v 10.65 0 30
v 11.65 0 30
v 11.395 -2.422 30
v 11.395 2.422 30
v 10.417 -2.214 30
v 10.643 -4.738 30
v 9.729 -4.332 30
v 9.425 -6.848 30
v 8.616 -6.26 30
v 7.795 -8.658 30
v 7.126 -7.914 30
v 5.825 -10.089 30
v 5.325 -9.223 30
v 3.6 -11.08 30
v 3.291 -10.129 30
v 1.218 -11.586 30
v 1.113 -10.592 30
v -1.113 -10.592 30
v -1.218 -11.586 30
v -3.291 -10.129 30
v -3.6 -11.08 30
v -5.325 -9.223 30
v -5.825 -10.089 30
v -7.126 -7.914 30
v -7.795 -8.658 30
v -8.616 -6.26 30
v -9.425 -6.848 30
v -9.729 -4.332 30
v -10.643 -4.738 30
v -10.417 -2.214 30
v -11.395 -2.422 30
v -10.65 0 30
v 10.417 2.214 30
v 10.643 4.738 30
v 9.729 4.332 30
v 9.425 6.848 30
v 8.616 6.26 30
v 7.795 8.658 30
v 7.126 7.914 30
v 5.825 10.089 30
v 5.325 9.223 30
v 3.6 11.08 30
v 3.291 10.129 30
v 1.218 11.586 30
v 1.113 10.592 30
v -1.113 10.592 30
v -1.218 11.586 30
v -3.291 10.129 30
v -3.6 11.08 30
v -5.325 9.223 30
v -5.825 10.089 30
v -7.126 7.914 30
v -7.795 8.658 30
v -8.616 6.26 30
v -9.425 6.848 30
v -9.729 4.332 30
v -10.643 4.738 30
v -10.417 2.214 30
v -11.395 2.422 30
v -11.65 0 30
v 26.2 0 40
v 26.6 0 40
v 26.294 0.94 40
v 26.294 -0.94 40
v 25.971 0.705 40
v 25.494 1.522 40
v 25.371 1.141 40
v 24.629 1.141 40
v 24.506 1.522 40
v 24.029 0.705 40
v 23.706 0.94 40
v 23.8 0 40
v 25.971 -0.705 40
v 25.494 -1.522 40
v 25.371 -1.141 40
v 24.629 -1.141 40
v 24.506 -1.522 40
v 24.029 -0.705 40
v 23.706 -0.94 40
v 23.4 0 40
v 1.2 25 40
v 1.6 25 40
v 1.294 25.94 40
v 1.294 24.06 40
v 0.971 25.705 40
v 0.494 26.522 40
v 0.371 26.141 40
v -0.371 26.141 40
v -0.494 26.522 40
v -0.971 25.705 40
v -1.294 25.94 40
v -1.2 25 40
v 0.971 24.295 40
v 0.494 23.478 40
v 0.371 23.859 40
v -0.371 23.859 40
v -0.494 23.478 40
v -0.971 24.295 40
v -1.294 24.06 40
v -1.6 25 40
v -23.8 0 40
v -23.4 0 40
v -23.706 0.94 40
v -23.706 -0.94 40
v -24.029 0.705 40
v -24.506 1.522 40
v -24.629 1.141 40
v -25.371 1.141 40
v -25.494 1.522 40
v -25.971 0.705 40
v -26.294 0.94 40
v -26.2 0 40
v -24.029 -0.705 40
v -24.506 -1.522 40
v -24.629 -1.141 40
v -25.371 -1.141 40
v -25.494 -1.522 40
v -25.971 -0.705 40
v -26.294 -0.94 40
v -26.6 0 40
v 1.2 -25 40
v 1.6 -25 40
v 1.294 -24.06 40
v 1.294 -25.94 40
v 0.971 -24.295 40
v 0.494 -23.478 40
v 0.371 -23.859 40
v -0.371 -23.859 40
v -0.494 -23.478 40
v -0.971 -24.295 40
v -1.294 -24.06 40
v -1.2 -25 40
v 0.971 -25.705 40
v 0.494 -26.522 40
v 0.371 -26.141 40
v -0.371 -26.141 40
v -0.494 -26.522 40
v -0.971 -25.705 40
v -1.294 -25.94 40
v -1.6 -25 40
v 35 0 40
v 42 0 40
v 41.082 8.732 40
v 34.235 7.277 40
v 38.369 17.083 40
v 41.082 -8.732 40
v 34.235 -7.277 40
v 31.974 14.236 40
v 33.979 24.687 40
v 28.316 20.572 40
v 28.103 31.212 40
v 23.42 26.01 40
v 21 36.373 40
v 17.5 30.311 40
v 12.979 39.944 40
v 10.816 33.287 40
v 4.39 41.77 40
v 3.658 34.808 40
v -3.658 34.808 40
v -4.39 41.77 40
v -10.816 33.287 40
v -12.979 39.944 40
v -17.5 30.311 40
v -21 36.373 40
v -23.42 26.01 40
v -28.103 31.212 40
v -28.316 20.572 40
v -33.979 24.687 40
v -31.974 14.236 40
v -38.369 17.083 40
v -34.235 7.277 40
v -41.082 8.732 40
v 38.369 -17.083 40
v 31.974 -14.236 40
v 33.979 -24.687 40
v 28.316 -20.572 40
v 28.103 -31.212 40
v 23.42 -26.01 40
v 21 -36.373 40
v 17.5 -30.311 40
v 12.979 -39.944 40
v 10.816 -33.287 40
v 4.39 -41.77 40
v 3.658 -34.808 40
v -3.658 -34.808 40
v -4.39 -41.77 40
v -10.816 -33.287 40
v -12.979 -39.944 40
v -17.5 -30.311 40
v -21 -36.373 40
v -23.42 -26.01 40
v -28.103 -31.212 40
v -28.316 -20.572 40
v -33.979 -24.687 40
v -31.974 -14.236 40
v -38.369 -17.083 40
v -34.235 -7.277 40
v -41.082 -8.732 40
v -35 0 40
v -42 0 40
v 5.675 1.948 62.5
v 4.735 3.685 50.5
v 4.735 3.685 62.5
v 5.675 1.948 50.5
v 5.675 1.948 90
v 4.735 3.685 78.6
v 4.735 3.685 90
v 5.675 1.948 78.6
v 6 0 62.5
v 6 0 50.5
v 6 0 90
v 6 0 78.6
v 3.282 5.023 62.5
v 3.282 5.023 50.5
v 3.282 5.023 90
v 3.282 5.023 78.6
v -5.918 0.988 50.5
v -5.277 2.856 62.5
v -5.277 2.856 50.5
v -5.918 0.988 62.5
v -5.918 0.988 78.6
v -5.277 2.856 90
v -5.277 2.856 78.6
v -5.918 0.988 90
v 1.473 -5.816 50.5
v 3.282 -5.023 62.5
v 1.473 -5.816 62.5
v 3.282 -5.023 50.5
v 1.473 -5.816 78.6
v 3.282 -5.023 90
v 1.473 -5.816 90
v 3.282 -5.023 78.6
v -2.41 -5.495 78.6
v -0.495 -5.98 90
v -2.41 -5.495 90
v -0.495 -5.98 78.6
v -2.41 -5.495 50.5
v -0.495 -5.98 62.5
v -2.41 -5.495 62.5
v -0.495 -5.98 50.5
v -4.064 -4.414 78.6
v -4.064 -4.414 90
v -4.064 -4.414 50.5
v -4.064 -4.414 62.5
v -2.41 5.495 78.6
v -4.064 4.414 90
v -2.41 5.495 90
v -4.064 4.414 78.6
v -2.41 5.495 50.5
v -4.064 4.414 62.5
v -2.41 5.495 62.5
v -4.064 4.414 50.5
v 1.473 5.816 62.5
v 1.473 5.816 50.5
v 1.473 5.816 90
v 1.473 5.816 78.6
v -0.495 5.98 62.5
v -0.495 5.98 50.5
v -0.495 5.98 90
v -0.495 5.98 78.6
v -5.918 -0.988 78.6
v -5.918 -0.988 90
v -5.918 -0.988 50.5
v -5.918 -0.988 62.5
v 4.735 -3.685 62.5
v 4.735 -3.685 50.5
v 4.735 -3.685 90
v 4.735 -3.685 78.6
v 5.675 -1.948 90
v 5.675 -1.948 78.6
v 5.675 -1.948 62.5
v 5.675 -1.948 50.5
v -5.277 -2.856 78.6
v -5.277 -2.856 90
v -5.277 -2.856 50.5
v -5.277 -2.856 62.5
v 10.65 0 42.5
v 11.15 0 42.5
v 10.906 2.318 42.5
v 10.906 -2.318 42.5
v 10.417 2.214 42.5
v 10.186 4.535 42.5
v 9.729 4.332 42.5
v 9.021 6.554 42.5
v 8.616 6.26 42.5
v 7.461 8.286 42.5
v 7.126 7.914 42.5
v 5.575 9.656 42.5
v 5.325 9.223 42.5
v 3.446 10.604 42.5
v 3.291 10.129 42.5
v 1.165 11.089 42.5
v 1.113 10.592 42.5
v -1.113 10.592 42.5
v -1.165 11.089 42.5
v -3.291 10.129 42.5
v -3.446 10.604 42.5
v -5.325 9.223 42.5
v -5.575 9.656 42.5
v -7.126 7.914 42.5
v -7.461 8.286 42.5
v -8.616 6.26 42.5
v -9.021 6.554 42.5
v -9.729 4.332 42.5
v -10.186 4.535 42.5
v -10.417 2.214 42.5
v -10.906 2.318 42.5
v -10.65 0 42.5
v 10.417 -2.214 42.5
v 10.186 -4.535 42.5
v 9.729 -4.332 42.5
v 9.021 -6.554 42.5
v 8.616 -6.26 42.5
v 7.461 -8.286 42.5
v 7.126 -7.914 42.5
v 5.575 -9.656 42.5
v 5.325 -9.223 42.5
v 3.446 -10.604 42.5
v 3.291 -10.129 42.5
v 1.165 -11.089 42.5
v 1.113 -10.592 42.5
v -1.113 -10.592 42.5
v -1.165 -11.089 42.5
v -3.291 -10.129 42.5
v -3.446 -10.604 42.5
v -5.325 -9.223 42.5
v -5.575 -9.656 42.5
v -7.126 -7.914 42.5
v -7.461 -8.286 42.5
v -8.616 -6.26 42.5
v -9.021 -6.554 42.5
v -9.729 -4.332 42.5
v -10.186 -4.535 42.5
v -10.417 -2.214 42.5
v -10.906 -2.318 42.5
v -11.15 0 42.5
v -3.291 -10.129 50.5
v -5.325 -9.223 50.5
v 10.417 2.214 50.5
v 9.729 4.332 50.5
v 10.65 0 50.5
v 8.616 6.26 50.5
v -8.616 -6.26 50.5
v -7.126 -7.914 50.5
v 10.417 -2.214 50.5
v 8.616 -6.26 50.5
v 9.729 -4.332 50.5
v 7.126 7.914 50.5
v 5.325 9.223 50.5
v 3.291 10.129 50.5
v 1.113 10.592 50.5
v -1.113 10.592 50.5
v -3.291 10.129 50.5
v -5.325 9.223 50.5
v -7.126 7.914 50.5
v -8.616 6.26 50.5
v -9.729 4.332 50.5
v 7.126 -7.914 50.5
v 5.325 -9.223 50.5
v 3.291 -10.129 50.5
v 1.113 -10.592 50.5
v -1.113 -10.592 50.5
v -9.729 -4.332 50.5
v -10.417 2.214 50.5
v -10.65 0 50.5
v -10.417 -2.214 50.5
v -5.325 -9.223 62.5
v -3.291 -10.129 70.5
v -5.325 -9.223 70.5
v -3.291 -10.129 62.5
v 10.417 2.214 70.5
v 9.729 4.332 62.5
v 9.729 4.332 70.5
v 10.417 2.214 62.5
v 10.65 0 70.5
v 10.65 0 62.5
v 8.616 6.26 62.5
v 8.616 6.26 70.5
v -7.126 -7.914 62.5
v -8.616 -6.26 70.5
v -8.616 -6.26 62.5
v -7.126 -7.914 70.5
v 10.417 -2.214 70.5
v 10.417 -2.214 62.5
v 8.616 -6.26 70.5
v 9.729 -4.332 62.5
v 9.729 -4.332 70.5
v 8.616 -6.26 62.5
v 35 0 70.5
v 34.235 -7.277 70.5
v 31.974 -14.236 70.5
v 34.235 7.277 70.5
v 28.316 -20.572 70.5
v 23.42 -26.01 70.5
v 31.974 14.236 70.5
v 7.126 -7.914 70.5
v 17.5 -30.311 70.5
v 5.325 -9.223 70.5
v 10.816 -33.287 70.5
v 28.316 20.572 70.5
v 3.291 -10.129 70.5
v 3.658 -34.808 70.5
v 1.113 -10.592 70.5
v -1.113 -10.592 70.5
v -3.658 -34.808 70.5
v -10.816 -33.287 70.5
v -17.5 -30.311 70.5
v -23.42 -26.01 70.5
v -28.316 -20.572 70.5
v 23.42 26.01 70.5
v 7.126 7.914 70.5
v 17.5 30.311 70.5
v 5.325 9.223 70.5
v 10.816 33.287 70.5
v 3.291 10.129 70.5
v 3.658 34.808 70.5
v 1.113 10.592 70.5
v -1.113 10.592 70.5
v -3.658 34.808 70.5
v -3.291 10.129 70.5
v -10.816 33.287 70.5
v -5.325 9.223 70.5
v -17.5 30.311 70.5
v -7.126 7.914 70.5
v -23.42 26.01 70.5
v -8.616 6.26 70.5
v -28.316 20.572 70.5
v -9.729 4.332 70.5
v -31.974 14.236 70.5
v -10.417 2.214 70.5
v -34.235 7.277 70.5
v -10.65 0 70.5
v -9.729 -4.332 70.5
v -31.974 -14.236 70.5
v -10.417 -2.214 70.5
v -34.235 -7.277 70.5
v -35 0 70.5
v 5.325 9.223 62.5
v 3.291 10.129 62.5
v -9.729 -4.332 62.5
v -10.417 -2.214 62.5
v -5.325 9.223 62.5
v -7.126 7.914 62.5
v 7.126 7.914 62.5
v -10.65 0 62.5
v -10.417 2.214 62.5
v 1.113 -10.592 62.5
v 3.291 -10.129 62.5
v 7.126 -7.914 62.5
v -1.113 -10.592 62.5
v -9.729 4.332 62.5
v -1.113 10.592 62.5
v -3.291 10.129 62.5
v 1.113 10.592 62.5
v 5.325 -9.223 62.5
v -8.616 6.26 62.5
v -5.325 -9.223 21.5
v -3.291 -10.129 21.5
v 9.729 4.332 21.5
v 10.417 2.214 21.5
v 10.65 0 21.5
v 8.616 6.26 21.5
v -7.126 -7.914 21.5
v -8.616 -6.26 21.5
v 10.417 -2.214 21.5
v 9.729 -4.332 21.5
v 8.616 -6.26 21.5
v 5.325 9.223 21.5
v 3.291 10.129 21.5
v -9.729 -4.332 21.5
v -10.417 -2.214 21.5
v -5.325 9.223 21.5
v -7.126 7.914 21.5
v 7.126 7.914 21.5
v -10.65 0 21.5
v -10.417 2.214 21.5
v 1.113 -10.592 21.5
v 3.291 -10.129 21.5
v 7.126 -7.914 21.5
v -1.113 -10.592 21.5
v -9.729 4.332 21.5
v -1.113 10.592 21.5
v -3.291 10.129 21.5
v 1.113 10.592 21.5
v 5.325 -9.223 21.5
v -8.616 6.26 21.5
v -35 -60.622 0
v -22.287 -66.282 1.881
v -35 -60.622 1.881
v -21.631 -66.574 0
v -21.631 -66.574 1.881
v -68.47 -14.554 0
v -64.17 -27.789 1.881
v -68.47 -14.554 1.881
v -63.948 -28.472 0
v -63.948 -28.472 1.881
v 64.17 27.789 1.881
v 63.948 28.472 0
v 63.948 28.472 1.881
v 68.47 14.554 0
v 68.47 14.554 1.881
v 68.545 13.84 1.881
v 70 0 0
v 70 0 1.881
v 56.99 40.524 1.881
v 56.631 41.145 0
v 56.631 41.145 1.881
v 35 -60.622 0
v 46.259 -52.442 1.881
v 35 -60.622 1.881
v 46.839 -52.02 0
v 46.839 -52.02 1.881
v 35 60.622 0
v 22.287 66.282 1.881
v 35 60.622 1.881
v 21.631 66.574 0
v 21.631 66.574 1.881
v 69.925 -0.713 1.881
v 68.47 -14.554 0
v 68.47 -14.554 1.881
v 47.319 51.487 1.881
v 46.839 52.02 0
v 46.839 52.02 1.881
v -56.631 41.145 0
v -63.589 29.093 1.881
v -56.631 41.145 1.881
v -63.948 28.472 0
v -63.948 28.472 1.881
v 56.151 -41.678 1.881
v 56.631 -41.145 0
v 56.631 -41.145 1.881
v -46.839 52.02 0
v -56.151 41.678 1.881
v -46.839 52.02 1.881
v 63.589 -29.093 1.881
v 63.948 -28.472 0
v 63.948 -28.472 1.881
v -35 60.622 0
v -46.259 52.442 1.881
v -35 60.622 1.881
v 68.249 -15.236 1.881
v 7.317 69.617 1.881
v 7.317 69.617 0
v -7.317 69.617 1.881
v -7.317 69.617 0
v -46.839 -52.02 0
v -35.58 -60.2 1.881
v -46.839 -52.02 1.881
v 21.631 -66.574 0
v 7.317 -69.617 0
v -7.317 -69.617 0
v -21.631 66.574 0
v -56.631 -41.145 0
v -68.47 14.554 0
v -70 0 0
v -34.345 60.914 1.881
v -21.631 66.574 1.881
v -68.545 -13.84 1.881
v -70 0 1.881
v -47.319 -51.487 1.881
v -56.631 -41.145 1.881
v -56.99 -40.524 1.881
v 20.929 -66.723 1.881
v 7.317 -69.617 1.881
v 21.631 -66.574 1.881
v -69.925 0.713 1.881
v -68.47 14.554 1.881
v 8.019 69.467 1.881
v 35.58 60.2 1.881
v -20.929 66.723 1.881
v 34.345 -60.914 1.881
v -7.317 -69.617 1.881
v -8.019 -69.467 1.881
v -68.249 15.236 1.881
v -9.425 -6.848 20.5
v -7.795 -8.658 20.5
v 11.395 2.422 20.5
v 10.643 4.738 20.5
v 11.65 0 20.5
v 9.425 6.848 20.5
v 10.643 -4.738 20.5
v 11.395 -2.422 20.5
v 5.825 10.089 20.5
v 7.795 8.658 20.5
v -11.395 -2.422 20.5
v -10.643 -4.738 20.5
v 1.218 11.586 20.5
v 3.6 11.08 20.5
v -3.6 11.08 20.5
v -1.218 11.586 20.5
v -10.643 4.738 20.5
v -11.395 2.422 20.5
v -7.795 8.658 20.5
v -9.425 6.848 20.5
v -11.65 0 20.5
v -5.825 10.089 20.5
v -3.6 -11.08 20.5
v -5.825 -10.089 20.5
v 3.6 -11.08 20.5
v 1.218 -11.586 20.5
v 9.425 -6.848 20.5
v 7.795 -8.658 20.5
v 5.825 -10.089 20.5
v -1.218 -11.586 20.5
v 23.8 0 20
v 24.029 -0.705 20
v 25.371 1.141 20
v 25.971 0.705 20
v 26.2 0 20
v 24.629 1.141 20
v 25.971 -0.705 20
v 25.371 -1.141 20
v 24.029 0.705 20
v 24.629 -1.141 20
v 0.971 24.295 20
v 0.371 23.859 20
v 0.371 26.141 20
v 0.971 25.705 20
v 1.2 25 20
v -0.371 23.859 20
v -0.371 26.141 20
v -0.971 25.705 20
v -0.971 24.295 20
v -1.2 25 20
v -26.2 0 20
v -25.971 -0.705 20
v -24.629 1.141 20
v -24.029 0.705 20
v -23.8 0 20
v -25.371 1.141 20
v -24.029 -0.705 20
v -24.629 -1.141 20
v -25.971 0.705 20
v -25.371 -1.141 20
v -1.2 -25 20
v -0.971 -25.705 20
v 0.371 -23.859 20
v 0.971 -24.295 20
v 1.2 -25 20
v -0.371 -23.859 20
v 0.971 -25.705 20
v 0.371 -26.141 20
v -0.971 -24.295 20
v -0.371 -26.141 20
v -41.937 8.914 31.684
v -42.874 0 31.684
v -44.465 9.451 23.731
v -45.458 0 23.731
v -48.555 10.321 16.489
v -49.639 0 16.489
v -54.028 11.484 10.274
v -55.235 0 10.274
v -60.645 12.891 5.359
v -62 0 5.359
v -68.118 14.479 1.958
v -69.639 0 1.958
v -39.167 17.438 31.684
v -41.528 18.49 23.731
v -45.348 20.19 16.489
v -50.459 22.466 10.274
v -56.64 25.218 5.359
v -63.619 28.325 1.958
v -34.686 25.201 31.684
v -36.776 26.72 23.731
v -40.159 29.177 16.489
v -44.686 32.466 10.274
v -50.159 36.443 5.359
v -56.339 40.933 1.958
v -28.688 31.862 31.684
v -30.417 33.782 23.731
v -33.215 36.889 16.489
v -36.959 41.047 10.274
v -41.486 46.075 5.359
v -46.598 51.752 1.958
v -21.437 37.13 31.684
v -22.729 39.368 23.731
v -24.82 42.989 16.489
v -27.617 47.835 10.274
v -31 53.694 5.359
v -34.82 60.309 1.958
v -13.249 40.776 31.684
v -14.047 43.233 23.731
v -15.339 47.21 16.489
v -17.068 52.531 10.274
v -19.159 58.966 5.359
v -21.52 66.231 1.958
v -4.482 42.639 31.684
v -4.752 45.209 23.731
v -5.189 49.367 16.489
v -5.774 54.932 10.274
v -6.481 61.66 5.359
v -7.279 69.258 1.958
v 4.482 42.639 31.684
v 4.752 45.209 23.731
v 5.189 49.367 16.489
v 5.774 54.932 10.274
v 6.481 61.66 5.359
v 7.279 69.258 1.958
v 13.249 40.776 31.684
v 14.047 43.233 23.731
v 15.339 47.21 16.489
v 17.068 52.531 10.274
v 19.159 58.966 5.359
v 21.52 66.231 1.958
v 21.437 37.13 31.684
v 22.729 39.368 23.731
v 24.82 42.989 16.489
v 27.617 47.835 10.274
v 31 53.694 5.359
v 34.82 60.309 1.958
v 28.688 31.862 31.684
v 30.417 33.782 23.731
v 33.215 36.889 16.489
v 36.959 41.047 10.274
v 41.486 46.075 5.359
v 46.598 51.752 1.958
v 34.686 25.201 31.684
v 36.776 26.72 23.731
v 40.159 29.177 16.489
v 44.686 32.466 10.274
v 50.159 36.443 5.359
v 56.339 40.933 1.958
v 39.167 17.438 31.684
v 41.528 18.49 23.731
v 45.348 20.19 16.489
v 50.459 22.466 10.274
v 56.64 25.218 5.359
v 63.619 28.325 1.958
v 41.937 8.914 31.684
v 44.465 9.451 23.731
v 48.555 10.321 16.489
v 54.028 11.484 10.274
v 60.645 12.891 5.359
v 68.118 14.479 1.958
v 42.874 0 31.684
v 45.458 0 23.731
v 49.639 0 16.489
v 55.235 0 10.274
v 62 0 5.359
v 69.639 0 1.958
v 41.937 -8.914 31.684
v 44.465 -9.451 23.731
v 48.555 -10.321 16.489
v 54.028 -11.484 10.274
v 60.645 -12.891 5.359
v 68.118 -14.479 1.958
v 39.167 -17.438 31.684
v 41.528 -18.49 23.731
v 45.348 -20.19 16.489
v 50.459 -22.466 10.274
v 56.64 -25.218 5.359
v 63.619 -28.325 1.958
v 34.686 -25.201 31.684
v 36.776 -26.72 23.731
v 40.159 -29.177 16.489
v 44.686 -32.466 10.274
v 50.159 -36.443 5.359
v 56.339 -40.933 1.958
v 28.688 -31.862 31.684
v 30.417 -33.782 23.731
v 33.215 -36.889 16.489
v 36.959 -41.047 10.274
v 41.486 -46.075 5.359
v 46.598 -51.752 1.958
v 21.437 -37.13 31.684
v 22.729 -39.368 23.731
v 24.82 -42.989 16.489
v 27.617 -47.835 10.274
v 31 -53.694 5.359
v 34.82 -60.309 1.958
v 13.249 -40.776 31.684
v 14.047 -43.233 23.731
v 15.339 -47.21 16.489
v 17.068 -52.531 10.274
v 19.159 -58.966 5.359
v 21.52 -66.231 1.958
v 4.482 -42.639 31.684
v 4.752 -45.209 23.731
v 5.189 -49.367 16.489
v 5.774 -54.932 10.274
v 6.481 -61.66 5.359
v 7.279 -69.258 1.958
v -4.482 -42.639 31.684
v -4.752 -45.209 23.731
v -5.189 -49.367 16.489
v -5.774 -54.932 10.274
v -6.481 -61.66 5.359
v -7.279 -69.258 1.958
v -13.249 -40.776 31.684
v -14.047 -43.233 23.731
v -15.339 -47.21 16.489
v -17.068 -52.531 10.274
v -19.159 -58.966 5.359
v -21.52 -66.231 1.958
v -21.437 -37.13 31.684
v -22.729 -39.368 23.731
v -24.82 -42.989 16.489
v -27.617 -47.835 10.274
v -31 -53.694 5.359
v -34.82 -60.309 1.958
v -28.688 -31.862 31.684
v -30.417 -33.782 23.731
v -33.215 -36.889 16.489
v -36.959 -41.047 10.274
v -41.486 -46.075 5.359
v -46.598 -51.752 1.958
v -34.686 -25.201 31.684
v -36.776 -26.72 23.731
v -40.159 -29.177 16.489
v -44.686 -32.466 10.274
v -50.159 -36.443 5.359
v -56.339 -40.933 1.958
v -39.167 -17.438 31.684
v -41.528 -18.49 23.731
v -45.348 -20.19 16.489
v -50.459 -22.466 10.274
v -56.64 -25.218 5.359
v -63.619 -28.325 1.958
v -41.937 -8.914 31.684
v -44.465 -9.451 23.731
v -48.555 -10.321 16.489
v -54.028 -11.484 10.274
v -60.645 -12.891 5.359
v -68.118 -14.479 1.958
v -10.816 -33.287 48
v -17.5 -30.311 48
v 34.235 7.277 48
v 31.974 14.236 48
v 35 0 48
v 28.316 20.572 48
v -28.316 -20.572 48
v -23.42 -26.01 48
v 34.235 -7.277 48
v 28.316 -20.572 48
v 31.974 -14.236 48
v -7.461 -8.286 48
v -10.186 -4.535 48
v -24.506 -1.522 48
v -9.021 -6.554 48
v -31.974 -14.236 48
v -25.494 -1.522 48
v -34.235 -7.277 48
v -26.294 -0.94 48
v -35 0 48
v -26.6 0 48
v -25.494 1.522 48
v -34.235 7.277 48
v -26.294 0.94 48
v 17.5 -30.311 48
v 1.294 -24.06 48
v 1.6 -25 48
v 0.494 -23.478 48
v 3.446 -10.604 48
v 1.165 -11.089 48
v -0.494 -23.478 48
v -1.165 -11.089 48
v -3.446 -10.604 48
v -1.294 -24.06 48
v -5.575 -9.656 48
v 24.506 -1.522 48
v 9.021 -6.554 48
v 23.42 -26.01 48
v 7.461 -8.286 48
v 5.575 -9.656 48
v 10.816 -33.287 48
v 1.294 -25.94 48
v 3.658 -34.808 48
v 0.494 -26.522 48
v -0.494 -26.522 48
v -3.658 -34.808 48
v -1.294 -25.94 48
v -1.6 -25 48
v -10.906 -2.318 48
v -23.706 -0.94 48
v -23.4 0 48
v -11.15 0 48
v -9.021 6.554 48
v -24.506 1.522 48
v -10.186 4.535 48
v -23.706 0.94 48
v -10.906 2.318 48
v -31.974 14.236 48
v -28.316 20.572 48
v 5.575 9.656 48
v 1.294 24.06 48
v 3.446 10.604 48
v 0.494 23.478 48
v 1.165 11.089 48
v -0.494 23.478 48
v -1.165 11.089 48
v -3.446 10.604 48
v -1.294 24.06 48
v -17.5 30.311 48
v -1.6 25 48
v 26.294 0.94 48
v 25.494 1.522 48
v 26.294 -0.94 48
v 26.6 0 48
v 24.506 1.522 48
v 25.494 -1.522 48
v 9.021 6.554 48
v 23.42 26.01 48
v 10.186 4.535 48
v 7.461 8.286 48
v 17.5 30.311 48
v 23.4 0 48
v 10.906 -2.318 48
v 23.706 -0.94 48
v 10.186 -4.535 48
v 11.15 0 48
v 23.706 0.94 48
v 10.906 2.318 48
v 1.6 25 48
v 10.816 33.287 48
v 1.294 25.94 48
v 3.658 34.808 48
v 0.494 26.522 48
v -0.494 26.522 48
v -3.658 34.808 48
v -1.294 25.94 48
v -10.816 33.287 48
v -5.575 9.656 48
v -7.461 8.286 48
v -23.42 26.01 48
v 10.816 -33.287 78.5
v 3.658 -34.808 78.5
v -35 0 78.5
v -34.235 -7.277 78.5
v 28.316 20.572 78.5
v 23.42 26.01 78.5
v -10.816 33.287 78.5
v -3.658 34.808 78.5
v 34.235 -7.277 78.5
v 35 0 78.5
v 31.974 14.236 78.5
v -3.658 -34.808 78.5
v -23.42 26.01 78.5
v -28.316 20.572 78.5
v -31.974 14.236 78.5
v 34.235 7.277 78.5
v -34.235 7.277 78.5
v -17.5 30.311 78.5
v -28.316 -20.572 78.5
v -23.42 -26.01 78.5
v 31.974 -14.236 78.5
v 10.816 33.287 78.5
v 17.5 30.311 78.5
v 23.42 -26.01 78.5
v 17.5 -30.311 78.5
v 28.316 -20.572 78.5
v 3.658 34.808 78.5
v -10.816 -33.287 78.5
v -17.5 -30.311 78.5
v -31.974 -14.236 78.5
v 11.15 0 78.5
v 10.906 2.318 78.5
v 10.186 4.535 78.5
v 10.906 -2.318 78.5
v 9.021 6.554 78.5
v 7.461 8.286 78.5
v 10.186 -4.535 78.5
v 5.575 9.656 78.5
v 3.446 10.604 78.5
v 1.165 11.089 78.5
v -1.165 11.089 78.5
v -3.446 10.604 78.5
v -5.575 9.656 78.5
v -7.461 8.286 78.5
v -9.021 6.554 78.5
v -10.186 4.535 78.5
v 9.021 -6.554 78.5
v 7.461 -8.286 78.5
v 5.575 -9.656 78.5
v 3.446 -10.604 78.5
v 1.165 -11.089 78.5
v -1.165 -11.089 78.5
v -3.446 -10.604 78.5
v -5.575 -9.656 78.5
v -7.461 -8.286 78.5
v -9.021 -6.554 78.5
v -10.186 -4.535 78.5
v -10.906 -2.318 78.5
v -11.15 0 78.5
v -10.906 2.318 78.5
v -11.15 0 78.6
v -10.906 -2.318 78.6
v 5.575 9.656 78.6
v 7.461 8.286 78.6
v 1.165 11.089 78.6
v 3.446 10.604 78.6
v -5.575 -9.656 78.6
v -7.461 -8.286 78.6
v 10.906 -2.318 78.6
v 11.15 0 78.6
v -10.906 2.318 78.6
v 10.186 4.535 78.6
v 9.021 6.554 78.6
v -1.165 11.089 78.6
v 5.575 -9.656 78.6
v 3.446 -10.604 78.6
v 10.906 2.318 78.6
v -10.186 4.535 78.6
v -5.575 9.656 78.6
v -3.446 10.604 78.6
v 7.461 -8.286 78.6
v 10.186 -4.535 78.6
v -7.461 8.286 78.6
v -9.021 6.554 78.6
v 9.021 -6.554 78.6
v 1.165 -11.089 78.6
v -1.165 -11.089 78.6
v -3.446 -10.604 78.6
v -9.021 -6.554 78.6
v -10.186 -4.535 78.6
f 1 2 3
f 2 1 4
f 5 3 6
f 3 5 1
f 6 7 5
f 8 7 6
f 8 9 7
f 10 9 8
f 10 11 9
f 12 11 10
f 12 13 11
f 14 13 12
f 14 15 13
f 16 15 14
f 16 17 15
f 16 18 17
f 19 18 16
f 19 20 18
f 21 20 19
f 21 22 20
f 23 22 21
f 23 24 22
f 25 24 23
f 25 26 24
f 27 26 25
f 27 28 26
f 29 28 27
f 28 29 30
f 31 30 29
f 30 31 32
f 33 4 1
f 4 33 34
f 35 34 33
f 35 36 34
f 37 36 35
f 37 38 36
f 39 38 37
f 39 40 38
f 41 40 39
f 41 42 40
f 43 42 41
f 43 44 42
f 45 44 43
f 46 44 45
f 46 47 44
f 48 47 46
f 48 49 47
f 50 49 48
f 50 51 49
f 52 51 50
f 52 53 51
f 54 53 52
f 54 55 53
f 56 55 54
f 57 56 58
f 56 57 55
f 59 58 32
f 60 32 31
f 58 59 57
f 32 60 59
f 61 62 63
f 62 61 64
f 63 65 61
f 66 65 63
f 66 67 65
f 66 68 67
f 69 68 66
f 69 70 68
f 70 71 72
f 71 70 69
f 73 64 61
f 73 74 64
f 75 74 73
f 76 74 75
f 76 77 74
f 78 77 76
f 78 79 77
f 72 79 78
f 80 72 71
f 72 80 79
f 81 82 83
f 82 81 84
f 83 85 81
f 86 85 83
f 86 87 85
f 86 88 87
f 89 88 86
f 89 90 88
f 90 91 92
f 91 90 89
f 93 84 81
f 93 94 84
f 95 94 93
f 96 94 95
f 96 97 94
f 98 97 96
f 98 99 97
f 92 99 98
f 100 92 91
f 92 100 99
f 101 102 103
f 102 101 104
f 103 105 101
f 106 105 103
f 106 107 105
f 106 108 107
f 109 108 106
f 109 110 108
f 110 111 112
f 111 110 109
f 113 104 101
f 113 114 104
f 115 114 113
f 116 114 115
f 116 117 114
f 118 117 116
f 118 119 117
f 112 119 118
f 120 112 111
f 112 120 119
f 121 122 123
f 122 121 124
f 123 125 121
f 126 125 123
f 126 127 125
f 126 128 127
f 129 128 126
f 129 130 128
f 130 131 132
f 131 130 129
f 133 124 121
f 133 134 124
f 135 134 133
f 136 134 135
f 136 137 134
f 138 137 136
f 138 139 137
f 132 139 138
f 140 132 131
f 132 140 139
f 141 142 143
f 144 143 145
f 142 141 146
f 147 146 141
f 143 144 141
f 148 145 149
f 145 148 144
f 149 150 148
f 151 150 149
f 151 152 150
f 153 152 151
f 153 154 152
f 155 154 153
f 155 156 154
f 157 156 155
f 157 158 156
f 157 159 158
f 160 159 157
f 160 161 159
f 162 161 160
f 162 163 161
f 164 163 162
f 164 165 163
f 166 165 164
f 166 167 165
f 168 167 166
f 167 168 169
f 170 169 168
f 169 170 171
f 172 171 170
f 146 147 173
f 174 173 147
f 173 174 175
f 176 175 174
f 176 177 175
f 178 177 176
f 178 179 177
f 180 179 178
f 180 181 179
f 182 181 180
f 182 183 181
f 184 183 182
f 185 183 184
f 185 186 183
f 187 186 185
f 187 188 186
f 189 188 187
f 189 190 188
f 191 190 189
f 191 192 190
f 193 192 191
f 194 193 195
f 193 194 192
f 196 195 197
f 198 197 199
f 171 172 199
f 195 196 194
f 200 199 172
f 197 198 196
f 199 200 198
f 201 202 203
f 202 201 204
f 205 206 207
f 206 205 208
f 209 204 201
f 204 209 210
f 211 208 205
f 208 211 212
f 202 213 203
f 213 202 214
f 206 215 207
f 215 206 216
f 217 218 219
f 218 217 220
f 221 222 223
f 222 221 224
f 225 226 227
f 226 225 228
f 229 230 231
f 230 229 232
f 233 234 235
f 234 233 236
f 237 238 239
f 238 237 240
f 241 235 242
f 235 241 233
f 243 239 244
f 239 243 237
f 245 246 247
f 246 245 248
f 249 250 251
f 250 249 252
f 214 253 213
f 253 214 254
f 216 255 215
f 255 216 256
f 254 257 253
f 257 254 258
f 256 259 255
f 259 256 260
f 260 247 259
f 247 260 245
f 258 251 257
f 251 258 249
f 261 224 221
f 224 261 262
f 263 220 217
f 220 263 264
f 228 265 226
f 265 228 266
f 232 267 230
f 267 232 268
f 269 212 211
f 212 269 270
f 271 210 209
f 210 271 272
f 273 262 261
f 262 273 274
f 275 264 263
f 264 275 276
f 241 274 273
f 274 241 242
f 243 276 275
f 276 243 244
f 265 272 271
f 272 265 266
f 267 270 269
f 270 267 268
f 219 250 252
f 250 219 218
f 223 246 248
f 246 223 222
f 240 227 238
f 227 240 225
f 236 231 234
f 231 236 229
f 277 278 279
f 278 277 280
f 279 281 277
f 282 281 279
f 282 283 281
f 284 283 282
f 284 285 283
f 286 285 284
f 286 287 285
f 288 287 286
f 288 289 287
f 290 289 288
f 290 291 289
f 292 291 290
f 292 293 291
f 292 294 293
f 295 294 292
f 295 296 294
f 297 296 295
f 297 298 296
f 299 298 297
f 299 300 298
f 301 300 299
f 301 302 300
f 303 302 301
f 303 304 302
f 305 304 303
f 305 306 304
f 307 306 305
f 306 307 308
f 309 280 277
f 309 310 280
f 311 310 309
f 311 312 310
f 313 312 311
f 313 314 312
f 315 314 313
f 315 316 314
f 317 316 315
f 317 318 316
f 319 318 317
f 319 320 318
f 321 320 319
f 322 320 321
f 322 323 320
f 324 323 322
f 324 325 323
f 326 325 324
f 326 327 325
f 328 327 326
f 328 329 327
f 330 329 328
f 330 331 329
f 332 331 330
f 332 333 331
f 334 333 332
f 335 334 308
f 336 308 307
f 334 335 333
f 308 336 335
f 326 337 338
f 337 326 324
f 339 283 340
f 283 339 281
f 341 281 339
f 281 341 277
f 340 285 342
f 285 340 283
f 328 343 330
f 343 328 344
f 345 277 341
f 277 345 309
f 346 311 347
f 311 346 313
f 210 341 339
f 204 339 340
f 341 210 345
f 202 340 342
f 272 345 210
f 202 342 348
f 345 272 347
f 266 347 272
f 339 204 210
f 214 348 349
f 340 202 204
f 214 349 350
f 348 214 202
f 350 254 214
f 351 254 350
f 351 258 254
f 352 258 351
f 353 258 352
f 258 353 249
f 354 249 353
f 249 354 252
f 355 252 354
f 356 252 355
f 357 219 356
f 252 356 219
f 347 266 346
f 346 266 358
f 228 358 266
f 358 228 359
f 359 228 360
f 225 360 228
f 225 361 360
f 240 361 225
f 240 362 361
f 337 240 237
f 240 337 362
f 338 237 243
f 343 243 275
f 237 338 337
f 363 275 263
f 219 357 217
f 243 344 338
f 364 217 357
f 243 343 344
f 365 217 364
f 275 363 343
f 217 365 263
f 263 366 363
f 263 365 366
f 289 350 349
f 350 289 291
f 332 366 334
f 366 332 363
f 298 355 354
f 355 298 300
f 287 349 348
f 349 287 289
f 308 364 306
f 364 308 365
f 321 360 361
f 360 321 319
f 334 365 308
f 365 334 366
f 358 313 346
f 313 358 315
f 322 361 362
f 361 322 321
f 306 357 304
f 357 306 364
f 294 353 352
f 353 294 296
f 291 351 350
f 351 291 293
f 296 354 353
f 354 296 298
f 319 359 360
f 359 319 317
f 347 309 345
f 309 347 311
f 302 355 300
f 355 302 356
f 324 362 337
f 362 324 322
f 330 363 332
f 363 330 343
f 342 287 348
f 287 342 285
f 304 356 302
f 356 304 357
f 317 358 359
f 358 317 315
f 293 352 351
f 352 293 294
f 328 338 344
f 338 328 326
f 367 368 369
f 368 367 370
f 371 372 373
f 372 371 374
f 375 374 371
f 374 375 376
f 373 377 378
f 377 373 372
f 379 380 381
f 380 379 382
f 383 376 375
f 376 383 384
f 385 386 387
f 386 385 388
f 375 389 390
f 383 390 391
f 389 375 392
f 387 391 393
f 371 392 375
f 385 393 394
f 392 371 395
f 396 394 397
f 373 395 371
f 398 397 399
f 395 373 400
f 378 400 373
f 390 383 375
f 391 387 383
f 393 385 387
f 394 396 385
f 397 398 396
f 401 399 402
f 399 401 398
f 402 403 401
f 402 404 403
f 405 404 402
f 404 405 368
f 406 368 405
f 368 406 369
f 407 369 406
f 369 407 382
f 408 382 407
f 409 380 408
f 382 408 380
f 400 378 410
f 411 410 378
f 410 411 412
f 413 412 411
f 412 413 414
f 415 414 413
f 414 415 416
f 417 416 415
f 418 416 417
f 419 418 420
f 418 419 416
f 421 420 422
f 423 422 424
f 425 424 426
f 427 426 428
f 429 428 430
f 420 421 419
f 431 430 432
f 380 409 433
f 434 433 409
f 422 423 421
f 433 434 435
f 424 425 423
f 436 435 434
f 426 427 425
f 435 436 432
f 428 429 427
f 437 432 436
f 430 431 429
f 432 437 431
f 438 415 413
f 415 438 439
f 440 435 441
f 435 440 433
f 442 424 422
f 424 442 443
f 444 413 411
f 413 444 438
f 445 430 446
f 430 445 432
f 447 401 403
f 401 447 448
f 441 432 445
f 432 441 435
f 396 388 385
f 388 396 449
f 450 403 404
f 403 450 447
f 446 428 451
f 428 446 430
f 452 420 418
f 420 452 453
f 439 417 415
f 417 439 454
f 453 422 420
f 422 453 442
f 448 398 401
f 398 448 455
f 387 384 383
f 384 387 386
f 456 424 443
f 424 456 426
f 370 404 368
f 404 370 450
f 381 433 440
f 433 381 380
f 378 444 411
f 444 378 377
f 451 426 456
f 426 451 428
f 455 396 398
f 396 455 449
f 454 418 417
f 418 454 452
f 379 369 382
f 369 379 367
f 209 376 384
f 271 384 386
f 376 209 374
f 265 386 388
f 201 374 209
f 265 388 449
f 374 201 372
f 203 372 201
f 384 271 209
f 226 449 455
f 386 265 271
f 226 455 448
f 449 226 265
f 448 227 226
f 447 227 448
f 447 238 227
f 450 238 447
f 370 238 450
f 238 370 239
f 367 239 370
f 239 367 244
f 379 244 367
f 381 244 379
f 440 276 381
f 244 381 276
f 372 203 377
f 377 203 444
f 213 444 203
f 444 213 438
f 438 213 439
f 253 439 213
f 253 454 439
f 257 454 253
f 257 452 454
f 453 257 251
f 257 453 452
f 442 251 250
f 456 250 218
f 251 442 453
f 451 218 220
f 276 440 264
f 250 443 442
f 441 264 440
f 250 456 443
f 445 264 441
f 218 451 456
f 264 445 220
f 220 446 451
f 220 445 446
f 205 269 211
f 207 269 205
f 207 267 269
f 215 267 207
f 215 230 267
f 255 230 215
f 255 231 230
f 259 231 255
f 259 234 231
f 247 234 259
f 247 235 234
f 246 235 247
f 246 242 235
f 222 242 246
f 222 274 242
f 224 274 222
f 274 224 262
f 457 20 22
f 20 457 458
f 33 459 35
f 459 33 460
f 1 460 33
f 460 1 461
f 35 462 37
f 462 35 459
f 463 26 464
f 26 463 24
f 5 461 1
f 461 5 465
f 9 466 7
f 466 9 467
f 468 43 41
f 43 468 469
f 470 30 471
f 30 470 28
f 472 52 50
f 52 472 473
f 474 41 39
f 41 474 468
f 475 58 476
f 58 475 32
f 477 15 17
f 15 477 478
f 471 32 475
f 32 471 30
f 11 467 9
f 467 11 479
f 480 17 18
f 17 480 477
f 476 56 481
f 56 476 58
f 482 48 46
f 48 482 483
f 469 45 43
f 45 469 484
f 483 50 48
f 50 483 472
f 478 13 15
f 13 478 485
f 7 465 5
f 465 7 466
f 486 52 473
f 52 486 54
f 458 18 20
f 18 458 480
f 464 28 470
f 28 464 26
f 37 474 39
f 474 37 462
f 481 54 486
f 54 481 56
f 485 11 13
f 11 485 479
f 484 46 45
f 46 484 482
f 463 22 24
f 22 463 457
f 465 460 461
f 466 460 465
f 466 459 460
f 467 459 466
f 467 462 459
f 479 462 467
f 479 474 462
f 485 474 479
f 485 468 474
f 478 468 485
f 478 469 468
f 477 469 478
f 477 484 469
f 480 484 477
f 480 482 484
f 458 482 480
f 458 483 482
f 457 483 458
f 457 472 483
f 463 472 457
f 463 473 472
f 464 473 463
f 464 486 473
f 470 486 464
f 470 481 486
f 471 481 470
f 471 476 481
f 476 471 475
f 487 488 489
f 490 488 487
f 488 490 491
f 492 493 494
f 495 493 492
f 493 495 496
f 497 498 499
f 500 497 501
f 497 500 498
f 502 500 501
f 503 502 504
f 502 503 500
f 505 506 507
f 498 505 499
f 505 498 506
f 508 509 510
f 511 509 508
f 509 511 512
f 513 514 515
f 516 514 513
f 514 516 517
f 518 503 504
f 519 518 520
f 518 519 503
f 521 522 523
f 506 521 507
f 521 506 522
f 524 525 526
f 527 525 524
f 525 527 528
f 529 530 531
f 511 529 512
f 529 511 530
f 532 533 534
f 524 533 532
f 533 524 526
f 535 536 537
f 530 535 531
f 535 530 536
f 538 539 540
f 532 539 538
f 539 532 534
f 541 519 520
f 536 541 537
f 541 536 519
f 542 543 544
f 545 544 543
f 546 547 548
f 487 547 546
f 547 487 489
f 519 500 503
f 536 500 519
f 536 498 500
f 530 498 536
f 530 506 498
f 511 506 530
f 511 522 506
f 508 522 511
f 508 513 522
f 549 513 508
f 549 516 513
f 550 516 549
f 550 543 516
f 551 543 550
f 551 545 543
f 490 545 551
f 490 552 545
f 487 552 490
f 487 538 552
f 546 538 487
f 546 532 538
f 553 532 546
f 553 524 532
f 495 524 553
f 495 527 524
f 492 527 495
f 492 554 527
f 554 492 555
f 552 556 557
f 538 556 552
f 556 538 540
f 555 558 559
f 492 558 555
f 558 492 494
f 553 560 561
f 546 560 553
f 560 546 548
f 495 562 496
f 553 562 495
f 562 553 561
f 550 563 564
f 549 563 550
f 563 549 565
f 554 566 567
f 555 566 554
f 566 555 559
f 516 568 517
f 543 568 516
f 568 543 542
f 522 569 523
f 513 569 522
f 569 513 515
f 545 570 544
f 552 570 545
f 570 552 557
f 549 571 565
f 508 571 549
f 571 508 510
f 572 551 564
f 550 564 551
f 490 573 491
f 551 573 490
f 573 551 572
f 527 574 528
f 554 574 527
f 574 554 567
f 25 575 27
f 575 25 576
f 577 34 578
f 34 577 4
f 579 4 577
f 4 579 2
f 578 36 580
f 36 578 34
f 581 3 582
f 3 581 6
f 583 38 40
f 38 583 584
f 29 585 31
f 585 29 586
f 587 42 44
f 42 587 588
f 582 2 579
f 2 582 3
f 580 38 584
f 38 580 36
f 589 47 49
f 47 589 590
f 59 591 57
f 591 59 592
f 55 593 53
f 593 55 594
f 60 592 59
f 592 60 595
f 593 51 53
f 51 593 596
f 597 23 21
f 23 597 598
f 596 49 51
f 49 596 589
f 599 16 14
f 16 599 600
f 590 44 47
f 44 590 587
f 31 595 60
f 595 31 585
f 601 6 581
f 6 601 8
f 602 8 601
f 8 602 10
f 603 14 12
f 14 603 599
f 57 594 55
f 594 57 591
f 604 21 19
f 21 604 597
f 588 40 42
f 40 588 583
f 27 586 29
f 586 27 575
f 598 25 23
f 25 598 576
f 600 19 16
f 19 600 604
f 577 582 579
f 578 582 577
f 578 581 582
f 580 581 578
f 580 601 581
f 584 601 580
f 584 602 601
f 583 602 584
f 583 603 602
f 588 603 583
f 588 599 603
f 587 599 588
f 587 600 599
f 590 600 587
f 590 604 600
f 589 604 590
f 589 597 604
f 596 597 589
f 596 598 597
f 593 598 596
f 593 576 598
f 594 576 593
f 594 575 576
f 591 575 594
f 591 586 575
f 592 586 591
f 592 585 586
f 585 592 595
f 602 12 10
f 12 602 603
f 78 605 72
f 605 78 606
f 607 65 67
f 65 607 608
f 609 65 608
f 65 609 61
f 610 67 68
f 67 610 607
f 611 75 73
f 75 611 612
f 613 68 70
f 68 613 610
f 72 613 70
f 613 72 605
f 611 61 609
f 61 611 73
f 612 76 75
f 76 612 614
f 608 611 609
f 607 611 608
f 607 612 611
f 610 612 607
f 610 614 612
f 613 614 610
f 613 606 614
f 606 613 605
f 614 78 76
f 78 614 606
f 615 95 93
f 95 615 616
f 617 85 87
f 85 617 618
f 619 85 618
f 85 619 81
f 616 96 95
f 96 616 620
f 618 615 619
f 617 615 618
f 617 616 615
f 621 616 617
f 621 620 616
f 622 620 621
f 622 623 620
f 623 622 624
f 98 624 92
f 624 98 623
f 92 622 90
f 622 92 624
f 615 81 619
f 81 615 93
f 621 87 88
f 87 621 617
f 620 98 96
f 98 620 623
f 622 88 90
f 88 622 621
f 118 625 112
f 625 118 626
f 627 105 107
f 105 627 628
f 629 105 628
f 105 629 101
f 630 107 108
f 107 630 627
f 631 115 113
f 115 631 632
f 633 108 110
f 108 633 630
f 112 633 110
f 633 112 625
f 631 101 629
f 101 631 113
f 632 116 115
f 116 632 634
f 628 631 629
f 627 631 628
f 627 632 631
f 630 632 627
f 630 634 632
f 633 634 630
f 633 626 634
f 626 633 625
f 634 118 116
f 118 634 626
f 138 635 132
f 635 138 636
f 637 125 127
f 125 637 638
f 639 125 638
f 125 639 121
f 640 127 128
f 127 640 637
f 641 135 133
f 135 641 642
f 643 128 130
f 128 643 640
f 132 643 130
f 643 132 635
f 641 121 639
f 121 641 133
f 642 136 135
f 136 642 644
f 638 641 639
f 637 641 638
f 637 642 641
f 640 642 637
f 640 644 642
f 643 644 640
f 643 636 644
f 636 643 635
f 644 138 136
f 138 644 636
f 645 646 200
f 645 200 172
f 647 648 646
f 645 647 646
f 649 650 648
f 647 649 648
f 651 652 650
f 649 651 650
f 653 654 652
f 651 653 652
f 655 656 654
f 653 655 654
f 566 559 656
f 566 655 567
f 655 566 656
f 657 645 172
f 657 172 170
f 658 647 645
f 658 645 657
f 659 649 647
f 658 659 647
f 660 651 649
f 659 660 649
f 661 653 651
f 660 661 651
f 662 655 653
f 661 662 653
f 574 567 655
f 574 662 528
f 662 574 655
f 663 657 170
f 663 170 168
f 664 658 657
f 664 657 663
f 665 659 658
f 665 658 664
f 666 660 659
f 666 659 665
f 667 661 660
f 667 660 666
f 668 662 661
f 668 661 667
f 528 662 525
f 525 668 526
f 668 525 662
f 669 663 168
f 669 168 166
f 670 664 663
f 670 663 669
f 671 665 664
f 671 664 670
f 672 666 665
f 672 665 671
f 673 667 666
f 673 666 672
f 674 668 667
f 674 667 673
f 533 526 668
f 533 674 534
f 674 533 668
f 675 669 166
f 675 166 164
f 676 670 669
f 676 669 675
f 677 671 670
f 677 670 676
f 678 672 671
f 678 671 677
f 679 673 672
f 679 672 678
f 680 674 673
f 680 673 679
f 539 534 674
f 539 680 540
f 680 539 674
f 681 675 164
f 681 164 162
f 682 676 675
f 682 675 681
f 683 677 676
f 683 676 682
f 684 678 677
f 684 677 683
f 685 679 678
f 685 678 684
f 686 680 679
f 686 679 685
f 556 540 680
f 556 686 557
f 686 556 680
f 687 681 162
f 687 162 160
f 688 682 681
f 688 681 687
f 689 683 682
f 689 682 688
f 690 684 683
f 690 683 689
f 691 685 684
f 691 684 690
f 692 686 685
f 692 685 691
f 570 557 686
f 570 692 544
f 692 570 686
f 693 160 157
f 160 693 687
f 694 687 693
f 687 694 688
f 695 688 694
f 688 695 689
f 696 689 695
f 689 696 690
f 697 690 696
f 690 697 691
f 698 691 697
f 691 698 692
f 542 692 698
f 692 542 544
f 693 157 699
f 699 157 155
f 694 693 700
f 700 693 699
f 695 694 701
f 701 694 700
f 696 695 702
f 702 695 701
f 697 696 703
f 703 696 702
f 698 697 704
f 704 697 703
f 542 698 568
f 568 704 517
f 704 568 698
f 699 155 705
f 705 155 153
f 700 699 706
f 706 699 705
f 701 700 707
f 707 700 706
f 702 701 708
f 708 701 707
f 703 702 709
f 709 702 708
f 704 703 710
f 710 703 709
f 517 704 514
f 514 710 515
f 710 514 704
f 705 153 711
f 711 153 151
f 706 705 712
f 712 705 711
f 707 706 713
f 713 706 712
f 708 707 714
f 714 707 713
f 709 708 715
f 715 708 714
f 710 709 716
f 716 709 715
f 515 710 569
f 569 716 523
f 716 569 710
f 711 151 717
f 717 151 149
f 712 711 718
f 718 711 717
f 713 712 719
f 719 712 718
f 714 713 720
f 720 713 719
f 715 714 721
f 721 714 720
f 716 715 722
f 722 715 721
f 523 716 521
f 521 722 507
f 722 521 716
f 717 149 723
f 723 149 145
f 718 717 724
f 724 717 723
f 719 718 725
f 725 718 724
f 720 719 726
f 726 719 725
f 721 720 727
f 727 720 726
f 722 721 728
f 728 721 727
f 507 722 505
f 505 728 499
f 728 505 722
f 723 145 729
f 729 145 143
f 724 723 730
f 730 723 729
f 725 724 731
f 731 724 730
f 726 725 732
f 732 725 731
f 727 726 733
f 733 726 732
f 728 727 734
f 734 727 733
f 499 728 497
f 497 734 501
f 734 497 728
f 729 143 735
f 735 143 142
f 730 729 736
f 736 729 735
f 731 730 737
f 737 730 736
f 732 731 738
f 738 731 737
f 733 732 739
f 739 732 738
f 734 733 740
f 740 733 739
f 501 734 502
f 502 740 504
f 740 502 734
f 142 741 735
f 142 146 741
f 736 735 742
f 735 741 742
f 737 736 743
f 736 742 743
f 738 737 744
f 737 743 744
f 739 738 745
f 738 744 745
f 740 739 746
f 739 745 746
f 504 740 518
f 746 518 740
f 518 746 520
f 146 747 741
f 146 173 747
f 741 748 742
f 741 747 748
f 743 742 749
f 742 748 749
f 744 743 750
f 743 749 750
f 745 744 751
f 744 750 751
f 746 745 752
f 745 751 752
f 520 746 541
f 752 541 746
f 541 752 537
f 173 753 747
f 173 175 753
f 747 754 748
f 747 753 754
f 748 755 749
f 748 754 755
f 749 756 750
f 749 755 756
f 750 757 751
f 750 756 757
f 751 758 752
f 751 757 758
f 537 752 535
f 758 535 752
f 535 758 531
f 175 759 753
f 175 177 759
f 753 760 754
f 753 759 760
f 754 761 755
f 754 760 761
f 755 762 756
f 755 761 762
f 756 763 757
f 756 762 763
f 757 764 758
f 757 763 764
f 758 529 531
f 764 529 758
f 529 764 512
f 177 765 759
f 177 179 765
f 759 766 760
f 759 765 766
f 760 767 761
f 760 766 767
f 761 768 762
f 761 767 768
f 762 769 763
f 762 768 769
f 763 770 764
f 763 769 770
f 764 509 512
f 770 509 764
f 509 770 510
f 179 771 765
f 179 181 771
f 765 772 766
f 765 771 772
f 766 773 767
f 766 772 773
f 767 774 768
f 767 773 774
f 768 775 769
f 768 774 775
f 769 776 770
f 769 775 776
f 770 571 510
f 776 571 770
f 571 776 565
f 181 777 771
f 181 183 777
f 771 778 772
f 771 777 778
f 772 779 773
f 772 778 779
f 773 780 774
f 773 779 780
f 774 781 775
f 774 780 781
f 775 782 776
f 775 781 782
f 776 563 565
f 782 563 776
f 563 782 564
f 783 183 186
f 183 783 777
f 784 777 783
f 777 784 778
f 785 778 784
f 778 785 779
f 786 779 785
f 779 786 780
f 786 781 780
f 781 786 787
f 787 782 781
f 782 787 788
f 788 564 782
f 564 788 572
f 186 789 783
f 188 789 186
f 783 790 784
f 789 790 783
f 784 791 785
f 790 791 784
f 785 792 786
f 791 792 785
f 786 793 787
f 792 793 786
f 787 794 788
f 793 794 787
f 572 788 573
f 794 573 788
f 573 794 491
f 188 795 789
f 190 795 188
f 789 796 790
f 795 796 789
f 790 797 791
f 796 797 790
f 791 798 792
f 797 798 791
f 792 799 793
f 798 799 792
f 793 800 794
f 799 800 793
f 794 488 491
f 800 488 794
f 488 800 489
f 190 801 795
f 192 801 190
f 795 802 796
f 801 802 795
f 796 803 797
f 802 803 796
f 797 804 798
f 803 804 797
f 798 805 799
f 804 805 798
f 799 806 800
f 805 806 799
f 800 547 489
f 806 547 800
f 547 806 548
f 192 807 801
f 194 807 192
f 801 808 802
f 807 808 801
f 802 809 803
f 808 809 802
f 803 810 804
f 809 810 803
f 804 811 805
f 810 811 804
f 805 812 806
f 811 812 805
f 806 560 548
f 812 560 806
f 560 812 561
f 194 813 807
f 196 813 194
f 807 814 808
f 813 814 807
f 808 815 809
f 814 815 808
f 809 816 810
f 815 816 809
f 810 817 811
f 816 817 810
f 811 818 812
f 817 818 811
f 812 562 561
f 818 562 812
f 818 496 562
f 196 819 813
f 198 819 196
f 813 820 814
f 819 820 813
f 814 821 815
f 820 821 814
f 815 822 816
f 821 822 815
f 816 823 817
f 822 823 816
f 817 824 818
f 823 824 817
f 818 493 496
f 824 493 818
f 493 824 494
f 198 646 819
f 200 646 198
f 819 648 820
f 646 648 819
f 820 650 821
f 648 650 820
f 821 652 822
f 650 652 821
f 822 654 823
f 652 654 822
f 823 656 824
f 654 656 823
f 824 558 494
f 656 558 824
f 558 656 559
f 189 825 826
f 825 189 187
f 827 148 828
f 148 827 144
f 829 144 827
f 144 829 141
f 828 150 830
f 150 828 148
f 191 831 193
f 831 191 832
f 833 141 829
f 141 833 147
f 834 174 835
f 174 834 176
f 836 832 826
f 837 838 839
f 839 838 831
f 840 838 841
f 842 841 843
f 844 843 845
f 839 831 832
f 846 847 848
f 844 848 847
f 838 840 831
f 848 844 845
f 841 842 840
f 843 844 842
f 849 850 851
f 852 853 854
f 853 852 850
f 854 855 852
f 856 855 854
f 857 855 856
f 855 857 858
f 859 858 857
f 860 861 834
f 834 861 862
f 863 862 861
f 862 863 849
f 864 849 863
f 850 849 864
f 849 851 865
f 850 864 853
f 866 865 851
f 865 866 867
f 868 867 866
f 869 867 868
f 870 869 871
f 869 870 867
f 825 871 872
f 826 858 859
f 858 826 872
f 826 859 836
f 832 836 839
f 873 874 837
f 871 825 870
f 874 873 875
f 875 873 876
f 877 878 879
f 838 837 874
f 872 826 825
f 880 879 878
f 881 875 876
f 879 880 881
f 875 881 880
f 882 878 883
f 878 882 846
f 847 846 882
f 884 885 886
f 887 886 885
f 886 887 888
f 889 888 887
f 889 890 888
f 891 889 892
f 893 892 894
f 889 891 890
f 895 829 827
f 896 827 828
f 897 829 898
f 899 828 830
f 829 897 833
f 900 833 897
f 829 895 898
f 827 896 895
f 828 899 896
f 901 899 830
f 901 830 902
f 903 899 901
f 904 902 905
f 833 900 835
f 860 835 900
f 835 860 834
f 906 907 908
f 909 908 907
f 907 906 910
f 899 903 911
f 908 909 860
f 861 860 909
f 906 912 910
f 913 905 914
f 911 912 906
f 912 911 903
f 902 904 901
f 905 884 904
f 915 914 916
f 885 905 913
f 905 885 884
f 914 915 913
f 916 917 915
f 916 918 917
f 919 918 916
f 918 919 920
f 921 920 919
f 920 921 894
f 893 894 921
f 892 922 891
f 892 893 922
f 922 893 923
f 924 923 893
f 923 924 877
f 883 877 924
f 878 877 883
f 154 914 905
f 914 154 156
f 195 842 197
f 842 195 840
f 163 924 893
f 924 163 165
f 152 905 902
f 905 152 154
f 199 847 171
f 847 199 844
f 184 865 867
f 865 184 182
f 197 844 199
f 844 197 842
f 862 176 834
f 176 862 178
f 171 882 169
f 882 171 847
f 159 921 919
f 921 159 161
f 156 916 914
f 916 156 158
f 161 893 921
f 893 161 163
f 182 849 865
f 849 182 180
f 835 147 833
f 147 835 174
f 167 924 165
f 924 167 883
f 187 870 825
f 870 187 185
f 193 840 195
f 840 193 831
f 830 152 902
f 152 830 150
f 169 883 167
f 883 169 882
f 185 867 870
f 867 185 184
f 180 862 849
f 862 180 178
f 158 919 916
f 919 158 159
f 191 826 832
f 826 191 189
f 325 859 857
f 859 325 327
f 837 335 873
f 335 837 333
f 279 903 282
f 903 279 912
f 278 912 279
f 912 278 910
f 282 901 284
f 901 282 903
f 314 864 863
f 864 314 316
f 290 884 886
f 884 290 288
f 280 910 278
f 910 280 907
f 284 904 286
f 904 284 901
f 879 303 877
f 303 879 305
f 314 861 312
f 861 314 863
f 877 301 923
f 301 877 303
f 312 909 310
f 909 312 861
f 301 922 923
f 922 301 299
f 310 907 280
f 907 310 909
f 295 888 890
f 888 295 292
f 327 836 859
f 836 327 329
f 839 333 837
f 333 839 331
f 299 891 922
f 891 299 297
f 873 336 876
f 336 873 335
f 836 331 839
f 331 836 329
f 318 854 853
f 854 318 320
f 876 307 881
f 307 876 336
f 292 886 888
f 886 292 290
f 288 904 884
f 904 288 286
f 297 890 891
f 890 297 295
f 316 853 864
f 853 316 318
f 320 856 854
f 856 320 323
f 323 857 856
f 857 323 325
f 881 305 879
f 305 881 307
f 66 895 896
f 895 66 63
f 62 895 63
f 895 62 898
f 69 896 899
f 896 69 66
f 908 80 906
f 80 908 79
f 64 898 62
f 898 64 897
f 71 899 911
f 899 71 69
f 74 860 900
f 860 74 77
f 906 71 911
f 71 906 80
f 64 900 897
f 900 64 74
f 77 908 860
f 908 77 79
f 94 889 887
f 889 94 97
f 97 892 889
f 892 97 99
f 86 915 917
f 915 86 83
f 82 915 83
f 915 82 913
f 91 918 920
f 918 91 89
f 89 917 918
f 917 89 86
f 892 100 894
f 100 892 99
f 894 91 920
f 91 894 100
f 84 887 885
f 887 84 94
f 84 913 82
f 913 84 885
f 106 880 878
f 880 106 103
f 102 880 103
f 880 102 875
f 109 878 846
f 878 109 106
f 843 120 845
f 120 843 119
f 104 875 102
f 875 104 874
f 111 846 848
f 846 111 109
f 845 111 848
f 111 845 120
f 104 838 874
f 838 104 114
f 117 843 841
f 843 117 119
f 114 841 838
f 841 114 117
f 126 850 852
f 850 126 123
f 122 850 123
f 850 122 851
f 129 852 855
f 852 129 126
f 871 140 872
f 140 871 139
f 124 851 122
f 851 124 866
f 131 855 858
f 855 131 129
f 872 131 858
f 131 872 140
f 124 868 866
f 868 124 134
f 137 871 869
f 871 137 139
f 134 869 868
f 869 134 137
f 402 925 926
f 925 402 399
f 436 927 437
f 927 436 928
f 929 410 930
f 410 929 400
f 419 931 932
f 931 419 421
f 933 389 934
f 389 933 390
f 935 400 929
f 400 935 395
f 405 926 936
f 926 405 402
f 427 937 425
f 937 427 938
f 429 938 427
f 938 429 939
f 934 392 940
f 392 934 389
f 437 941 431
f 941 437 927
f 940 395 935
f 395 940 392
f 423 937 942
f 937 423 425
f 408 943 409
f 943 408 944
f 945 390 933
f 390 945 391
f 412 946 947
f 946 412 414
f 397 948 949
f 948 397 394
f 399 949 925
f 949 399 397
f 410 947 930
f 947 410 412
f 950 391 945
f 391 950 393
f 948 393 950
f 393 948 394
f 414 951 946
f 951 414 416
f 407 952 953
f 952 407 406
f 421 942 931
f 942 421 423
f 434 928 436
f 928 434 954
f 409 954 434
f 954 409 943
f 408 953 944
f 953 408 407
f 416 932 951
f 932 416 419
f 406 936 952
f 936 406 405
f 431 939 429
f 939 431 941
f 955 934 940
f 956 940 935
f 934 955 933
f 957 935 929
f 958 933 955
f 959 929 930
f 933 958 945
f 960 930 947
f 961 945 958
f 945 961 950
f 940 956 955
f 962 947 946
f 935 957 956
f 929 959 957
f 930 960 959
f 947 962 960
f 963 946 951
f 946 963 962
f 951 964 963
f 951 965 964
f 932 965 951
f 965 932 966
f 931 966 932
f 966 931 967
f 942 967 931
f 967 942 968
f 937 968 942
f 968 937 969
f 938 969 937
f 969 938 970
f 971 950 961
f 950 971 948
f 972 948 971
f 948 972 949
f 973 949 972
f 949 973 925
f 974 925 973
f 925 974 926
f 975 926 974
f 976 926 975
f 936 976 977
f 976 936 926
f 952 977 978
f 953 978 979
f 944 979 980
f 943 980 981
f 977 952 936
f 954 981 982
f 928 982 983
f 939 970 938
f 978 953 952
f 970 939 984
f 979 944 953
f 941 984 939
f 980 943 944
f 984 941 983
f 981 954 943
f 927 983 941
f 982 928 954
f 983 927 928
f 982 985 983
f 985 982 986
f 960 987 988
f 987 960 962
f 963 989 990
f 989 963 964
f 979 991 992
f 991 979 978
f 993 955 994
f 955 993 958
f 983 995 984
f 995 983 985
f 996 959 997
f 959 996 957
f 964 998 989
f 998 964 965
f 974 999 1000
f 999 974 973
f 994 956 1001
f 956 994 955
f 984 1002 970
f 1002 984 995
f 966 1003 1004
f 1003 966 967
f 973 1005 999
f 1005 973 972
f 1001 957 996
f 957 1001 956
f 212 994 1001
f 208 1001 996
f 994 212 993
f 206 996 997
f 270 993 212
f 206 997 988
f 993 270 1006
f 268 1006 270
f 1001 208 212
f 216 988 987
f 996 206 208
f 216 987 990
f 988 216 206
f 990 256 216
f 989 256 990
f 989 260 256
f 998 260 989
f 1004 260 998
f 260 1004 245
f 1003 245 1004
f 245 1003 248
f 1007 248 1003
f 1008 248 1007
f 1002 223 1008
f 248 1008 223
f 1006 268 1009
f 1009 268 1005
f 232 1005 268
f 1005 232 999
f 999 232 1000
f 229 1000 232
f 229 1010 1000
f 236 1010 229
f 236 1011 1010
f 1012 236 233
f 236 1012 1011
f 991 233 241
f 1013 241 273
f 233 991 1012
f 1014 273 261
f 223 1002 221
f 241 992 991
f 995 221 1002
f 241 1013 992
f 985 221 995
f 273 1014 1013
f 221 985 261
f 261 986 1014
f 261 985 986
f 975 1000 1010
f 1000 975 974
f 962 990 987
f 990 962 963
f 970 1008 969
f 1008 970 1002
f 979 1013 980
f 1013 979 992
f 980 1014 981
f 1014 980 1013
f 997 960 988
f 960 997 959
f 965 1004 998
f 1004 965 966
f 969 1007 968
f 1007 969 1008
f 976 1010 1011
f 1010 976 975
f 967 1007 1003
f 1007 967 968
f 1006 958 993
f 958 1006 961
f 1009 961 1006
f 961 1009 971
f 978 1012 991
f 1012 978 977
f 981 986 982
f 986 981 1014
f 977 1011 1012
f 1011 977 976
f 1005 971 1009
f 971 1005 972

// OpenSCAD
screw_head_h = 8.5;
screw_head_r = 21.3 / 2;

screw_body_h = 60;
screw_body_r = 6;

bearing_h = 10;
bearing_r = 16;

pad_h = 2.5;

nut_r = screw_head_r;
nut_h = 8;

bottom_h = 40;

module bearing() {
	color ("yellow") {
		difference() {
			cylinder(h = bearing_h, r = bearing_r);
			cylinder(h = bearing_h, r = 6);
		}
	}
}

module pad() {
	color ("silver") {
		difference() {
			cylinder(h = pad_h, r=12);
			cylinder(h = pad_h, r=6);
		}
	}
}

module nut() {
	color ("silver") {
		difference() {
			cylinder(h = nut_h, r= nut_r);
			cylinder(h = nut_h, r=6);
		}
	}
}

module screw() {
	
	color("silver") {
		union() {
			//body
			translate([0, 0, screw_head_h]) {
				cylinder(h = screw_body_h, r = screw_body_r);
			}
			//head
			cylinder(h = screw_head_h, r = screw_head_r);
		}
	}
		
}

module steel() {
	union() {
		translate([0, 0, screw_head_h]) {
			bearing();
		}
		translate([0, 0, screw_head_h + bearing_h]) {
			pad();
		}
		translate([0, 0, screw_head_h + bearing_h + pad_h]) {
			nut();
		}
		translate([0, 0, screw_head_h + bearing_h + pad_h + 20]) {
			nut();
		}
		screw();
	}
}

module top() {
	translate([0, 0, screw_head_h + bearing_h + pad_h + nut_h + 20]) {
		cylinder(h = 8, r = 35);
		cylinder(h = 8.1, r = nut_r + 0.5);
	}
}

module bottom() {
	bottom_r = 70;
	
	color("blue") {
		difference() {
			cylinder(r = bottom_r, h = bottom_h);
			//bearing place
			translate([0, 0, bottom_h - bearing_h]) cylinder(r = bearing_r, h = bearing_h + 0.1);
			//screw head place
			translate([0, 0, bottom_h - bearing_h - screw_head_h - 1]) cylinder(r = screw_head_r + 1, h = screw_head_h + 1.1);
			//holes
			translate([25, 0, 20]) cylinder(h = 20.1, r = 1.2, $fn = 10);
			translate([0, 25, 20]) cylinder(h = 20.1, r = 1.2, $fn = 10);
			translate([-25, 0, 20]) cylinder(h = 20.1, r = 1.2, $fn = 10);
			translate([0, -25, 20]) cylinder(h = 20.1, r = 1.2, $fn = 10);
		}
	}
}

module b_holder() {
	color("red") {
		difference() {
			cylinder(h = 8, r = 35);
			cylinder(h = 8.1, r = nut_r + 0.5);
			//holes
			translate([25, 0, 0]) cylinder(h = 8.1, r = 1.6, $fn = 10);
			translate([0, 25, 0]) cylinder(h = 8.1, r = 1.6, $fn = 10);
			translate([-25, 0, 0]) cylinder(h = 8.1, r = 1.6, $fn = 10);
			translate([0, -25, 0]) cylinder(h = 8.1, r = 1.6, $fn = 10);
		}
	}
}

translate([0, 0, bottom_h - bearing_h - screw_head_h]) steel();

difference() {
	bottom();

	translate([0, 0, 40])
		rotate_extrude(convexity = 10) translate([82, 0, 0]) circle(r = 40); 
}

translate([0, 0, bottom_h])
	b_holder();
	
translate([0, 0, bottom_h - bearing_h - screw_head_h]) top();	
